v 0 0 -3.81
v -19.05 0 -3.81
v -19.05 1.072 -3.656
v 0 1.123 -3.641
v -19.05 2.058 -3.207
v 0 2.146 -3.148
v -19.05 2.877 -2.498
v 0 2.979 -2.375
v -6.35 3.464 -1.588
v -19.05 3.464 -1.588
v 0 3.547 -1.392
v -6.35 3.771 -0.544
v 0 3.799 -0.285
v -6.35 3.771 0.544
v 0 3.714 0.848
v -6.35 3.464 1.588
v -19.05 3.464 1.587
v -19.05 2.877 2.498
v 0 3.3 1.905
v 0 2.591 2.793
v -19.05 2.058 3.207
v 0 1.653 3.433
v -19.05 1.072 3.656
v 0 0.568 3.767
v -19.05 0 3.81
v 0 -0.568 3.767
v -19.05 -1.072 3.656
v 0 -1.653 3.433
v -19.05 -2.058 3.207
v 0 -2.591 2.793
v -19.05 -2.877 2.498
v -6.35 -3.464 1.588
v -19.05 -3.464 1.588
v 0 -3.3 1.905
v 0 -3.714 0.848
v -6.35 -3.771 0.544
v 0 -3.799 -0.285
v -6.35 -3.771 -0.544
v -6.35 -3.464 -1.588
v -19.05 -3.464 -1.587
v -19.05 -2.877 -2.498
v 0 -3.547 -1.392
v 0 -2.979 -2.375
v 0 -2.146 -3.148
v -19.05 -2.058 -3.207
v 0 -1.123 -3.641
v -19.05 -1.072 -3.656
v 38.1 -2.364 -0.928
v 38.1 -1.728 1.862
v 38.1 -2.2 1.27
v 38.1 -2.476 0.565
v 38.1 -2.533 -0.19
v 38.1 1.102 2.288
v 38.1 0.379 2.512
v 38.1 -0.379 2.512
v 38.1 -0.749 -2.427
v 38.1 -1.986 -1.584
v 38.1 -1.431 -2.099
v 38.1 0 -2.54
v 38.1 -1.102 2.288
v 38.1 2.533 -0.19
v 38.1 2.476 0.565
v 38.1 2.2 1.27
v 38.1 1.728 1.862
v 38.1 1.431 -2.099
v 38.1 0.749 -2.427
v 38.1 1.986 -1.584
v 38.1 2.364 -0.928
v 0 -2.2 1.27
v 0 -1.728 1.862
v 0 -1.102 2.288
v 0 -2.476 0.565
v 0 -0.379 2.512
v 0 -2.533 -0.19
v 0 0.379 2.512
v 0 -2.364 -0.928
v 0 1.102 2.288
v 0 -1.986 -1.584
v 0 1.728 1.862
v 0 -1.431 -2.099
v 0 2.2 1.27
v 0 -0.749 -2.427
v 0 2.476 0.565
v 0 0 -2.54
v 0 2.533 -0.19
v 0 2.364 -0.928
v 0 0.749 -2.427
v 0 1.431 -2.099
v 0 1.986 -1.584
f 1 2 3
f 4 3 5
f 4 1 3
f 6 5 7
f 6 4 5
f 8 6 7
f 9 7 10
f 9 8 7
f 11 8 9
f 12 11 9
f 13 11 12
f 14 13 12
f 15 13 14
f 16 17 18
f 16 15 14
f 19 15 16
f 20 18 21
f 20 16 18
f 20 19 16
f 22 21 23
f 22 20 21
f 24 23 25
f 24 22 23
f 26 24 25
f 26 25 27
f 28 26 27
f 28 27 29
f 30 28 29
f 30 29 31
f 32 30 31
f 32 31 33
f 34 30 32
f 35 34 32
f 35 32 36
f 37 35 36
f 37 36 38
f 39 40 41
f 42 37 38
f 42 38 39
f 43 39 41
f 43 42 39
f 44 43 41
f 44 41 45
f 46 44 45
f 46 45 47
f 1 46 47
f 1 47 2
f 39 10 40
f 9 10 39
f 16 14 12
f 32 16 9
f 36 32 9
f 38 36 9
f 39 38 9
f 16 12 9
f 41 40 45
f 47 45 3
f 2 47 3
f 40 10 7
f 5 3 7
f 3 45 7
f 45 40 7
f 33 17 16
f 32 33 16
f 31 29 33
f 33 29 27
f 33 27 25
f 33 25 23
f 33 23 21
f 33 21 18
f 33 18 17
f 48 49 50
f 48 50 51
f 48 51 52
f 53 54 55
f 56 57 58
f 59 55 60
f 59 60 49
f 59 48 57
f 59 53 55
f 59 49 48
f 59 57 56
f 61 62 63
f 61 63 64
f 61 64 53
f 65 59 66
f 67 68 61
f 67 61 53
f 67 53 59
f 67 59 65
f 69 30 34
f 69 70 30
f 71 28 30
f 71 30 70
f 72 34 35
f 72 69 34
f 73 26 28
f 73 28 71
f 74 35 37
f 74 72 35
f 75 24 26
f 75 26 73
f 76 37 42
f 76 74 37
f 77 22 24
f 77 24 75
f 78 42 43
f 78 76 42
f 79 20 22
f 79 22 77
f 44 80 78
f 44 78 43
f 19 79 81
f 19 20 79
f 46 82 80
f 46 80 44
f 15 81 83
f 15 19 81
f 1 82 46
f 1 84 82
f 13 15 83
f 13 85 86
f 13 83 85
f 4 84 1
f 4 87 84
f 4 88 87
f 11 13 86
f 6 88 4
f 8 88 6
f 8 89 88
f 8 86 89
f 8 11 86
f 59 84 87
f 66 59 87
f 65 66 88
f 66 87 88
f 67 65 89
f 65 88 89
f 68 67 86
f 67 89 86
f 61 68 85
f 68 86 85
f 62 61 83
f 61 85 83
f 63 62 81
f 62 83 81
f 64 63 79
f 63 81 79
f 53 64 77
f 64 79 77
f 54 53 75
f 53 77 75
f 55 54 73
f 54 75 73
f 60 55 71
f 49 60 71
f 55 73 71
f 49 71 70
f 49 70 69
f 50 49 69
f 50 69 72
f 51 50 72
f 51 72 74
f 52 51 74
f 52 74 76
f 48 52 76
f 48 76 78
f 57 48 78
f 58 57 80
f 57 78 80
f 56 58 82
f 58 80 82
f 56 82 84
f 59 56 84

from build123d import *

# Parameters (mm, degrees)
SKETCH1_R               = 2.54
BOSS_EXTRUDE1_DEPTH     = 38.1
SKETCH2_R               = 3.81
BOSS_EXTRUDE2_DEPTH     = 19.05
SKETCH3_W               = 12.7
SKETCH3_H               = 3.175
CUT_EXTRUDE1_DEPTH      = 4.81
CUT_EXTRUDE1_DEPTH_BACK = 4.81


with BuildPart() as part:
    # Sketch1 → Boss-Extrude1 (new body)
    with BuildSketch(Plane(origin=(0, 0, 0), x_dir=(0, 0, -1), z_dir=(1, 0, 0))):
        Circle(SKETCH1_R)
    extrude(amount=BOSS_EXTRUDE1_DEPTH)

    # Sketch2 → Boss-Extrude2 (add)
    with BuildSketch(Plane(origin=(0, 0, 0), x_dir=(0, 0, -1), z_dir=(1, 0, 0))):
        Circle(SKETCH2_R)
    extrude(amount=-BOSS_EXTRUDE2_DEPTH)

    # Sketch3 → Cut-Extrude1 (cut, two sides)
    with BuildSketch(Plane(origin=(0, 0, 0), x_dir=(1, 0, 0), z_dir=(0, 1, 0))) as cut_extrude1_sk:
        with Locations((-12.7, 0)):
            Rectangle(SKETCH3_W, SKETCH3_H)
    extrude(amount=CUT_EXTRUDE1_DEPTH, mode=Mode.SUBTRACT)
    extrude(cut_extrude1_sk.sketch, amount=-CUT_EXTRUDE1_DEPTH_BACK, mode=Mode.SUBTRACT)


solid = part.part
